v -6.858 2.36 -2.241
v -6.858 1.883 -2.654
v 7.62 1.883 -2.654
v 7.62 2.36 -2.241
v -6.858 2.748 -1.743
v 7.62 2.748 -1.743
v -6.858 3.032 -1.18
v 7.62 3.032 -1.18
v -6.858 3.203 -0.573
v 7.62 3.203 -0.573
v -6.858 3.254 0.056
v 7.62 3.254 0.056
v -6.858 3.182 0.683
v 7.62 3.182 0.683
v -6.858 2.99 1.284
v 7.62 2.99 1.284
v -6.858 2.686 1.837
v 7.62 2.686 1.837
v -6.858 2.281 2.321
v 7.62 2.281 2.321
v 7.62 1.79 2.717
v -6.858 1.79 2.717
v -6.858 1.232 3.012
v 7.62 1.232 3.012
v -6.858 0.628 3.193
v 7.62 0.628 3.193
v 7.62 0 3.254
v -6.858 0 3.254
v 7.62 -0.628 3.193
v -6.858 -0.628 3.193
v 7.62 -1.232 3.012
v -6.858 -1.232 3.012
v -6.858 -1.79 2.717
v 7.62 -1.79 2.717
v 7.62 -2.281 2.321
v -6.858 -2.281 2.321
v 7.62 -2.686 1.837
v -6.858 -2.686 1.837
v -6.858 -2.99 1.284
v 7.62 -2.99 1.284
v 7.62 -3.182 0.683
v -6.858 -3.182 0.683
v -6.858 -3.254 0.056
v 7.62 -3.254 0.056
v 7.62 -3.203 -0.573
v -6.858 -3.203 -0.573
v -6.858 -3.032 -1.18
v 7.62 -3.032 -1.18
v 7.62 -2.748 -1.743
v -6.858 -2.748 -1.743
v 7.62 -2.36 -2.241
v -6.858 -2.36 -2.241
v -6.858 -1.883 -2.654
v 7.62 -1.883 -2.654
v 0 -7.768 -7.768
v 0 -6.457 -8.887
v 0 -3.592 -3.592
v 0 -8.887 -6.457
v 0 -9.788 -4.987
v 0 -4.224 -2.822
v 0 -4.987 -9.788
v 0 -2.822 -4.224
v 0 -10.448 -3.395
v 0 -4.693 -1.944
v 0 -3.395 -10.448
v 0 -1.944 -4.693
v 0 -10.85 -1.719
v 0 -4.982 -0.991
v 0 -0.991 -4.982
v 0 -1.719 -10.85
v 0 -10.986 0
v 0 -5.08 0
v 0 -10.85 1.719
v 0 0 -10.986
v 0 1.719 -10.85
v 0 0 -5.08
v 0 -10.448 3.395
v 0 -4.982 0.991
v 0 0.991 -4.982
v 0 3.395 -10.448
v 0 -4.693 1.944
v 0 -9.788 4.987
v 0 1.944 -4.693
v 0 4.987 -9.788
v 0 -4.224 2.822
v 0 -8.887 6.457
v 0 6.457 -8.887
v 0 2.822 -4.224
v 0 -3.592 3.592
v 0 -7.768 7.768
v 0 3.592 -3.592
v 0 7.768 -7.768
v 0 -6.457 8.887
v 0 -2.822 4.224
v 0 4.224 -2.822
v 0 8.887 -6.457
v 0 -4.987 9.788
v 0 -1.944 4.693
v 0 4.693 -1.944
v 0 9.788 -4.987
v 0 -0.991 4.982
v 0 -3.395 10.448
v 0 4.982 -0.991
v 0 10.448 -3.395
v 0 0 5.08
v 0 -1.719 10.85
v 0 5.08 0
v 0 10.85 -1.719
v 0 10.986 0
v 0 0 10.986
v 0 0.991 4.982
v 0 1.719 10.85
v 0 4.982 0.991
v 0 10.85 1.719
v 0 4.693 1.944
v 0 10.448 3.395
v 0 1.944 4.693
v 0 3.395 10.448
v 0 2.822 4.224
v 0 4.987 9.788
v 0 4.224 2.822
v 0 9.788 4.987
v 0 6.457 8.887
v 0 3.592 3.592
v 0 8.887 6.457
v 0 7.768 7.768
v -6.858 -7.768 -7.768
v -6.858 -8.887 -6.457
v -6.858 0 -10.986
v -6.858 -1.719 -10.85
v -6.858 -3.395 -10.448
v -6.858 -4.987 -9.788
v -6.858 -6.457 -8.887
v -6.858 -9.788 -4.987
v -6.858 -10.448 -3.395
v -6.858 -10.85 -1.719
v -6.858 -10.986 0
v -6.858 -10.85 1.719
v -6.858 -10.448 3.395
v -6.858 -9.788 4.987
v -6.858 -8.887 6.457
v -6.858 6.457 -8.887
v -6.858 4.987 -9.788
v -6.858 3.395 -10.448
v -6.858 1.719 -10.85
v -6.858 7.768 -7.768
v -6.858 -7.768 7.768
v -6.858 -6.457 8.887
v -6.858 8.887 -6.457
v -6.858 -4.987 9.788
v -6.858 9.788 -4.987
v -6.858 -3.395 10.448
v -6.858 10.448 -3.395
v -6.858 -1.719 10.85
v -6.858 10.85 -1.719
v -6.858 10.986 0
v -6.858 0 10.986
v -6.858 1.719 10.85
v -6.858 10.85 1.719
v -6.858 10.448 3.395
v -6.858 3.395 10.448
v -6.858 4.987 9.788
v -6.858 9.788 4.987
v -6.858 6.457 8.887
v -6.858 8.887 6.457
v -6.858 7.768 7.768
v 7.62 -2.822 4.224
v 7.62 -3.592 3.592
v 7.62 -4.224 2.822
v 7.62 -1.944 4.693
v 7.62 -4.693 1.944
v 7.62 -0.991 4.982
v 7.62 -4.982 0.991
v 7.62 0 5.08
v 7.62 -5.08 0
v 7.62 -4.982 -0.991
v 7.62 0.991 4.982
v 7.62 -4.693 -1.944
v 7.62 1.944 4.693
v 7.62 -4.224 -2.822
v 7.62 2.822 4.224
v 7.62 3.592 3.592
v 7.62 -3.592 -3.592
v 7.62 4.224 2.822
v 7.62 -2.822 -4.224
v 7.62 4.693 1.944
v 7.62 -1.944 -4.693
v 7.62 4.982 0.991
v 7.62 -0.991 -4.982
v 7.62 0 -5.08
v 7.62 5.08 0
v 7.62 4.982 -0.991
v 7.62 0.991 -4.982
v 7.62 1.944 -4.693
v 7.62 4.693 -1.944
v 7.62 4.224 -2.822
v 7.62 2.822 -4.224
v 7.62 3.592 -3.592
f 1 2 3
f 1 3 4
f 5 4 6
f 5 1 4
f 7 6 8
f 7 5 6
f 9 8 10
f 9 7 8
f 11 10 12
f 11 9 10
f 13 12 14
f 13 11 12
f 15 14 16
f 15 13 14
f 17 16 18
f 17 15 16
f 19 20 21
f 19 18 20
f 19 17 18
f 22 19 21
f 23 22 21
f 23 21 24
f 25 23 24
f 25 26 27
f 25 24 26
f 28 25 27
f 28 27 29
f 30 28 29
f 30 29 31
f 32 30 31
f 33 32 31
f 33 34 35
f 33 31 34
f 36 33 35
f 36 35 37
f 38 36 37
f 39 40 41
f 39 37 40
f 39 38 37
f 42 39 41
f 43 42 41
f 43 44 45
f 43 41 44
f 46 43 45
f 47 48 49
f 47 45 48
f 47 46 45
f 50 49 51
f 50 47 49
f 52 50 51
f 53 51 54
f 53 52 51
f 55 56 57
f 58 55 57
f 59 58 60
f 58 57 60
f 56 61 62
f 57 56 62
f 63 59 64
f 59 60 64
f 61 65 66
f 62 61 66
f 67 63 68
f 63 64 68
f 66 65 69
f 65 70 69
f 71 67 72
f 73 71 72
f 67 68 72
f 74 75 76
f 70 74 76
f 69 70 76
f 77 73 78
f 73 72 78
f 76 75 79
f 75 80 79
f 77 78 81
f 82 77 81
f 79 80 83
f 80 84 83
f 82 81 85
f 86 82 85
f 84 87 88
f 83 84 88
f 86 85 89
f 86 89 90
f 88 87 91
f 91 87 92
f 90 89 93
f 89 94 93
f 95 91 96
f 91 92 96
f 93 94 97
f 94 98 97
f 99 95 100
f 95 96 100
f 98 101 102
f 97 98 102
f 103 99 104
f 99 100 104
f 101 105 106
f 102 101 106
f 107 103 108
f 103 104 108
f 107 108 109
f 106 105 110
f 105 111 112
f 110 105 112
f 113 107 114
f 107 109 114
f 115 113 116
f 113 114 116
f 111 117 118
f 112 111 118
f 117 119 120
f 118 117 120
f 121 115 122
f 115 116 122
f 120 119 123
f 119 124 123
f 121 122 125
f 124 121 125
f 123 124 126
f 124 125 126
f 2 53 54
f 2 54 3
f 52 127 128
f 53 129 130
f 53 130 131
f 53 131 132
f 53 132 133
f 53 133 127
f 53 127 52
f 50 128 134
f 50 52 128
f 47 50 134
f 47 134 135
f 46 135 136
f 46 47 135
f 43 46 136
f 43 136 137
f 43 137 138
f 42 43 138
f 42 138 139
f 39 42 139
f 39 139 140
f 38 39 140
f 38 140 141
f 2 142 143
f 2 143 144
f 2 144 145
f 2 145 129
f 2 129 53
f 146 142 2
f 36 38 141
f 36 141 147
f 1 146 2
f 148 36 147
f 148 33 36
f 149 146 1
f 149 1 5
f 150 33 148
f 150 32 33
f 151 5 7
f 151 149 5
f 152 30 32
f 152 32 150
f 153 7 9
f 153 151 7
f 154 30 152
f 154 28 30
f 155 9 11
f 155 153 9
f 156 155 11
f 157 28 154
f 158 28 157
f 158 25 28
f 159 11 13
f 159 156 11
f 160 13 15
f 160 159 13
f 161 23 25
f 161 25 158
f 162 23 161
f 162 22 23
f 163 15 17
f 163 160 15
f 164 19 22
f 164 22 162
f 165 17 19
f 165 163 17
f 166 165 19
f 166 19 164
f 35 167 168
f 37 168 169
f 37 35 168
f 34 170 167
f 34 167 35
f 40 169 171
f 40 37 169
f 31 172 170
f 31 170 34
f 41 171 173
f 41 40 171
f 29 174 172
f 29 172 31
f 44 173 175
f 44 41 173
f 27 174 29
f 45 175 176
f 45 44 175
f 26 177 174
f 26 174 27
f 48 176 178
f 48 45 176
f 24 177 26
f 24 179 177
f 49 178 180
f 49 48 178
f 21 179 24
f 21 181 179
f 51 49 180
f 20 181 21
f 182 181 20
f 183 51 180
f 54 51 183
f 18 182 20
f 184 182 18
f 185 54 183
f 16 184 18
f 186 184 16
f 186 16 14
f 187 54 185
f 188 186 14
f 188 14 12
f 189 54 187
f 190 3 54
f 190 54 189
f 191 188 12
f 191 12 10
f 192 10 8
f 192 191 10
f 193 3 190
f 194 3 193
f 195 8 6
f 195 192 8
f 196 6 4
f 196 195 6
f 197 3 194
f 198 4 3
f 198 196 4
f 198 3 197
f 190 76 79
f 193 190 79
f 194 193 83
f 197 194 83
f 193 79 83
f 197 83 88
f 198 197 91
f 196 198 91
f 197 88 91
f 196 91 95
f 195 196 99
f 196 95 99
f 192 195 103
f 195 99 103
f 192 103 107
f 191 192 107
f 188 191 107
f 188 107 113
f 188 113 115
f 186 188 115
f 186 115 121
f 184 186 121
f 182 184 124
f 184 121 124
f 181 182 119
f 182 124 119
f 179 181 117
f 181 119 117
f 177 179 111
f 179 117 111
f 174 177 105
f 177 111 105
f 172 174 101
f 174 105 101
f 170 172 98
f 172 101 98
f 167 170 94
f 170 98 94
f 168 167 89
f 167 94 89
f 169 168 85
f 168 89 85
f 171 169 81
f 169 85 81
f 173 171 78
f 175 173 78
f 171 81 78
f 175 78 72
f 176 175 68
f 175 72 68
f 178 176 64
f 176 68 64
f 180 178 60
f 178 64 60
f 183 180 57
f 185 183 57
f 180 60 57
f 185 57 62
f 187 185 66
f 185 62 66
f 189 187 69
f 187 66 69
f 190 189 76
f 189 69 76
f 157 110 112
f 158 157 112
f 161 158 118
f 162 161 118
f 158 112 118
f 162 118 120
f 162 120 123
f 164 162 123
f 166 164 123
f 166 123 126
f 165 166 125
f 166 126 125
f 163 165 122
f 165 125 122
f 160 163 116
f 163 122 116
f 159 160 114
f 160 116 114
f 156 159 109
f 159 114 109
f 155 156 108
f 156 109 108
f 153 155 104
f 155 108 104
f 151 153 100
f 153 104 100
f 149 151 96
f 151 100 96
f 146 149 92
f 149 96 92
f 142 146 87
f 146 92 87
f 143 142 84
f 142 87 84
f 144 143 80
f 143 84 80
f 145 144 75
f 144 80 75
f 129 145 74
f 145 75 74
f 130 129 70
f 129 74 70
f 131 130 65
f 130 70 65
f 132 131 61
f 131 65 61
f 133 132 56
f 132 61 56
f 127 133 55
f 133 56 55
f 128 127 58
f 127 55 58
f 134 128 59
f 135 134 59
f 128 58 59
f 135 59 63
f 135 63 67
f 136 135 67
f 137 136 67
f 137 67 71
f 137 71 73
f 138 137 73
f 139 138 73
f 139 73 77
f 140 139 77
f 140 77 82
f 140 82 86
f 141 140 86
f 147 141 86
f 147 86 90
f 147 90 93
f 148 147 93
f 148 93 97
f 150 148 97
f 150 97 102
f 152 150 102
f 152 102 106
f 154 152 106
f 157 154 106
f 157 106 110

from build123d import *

# Parameters (mm, degrees)
SKETCH1_R           = 5.08
BOSS_EXTRUDE1_DEPTH = 7.62
SKETCH2_R           = 10.9855
BOSS_EXTRUDE2_DEPTH = 6.858
CUT_EXTRUDE1_REACH  = 16.478


with BuildPart() as part:
    # Sketch1 → Boss-Extrude1 (new body)
    with BuildSketch(Plane(origin=(0, 0, 0), x_dir=(0, 0, -1), z_dir=(1, 0, 0))):
        Circle(SKETCH1_R)
    extrude(amount=BOSS_EXTRUDE1_DEPTH)

    # Sketch2 → Boss-Extrude2 (add)
    with BuildSketch(Plane.ZY):
        Circle(SKETCH2_R)
    extrude(amount=BOSS_EXTRUDE2_DEPTH)

    # Sketch3 → Cut-Extrude1 (cut, up to next)
    with BuildSketch(Plane.ZY.offset(6.858), mode=Mode.PRIVATE) as cut_extrude1_sk1:
        with BuildLine():
            Line((-2.654, -1.882763926), (-2.654, 1.882763926))
            ThreePointArc((-2.654, 1.882763926), (3.254, 0), (-2.654, -1.882763926))
        make_face()
    cut_extrude1_tool1 = extrude(cut_extrude1_sk1.sketch, amount=-CUT_EXTRUDE1_REACH, mode=Mode.PRIVATE) & part.part
    add(cut_extrude1_tool1.solids().sort_by_distance((-6.858, 0, 0.140232))[0], mode=Mode.SUBTRACT)


solid = part.part
